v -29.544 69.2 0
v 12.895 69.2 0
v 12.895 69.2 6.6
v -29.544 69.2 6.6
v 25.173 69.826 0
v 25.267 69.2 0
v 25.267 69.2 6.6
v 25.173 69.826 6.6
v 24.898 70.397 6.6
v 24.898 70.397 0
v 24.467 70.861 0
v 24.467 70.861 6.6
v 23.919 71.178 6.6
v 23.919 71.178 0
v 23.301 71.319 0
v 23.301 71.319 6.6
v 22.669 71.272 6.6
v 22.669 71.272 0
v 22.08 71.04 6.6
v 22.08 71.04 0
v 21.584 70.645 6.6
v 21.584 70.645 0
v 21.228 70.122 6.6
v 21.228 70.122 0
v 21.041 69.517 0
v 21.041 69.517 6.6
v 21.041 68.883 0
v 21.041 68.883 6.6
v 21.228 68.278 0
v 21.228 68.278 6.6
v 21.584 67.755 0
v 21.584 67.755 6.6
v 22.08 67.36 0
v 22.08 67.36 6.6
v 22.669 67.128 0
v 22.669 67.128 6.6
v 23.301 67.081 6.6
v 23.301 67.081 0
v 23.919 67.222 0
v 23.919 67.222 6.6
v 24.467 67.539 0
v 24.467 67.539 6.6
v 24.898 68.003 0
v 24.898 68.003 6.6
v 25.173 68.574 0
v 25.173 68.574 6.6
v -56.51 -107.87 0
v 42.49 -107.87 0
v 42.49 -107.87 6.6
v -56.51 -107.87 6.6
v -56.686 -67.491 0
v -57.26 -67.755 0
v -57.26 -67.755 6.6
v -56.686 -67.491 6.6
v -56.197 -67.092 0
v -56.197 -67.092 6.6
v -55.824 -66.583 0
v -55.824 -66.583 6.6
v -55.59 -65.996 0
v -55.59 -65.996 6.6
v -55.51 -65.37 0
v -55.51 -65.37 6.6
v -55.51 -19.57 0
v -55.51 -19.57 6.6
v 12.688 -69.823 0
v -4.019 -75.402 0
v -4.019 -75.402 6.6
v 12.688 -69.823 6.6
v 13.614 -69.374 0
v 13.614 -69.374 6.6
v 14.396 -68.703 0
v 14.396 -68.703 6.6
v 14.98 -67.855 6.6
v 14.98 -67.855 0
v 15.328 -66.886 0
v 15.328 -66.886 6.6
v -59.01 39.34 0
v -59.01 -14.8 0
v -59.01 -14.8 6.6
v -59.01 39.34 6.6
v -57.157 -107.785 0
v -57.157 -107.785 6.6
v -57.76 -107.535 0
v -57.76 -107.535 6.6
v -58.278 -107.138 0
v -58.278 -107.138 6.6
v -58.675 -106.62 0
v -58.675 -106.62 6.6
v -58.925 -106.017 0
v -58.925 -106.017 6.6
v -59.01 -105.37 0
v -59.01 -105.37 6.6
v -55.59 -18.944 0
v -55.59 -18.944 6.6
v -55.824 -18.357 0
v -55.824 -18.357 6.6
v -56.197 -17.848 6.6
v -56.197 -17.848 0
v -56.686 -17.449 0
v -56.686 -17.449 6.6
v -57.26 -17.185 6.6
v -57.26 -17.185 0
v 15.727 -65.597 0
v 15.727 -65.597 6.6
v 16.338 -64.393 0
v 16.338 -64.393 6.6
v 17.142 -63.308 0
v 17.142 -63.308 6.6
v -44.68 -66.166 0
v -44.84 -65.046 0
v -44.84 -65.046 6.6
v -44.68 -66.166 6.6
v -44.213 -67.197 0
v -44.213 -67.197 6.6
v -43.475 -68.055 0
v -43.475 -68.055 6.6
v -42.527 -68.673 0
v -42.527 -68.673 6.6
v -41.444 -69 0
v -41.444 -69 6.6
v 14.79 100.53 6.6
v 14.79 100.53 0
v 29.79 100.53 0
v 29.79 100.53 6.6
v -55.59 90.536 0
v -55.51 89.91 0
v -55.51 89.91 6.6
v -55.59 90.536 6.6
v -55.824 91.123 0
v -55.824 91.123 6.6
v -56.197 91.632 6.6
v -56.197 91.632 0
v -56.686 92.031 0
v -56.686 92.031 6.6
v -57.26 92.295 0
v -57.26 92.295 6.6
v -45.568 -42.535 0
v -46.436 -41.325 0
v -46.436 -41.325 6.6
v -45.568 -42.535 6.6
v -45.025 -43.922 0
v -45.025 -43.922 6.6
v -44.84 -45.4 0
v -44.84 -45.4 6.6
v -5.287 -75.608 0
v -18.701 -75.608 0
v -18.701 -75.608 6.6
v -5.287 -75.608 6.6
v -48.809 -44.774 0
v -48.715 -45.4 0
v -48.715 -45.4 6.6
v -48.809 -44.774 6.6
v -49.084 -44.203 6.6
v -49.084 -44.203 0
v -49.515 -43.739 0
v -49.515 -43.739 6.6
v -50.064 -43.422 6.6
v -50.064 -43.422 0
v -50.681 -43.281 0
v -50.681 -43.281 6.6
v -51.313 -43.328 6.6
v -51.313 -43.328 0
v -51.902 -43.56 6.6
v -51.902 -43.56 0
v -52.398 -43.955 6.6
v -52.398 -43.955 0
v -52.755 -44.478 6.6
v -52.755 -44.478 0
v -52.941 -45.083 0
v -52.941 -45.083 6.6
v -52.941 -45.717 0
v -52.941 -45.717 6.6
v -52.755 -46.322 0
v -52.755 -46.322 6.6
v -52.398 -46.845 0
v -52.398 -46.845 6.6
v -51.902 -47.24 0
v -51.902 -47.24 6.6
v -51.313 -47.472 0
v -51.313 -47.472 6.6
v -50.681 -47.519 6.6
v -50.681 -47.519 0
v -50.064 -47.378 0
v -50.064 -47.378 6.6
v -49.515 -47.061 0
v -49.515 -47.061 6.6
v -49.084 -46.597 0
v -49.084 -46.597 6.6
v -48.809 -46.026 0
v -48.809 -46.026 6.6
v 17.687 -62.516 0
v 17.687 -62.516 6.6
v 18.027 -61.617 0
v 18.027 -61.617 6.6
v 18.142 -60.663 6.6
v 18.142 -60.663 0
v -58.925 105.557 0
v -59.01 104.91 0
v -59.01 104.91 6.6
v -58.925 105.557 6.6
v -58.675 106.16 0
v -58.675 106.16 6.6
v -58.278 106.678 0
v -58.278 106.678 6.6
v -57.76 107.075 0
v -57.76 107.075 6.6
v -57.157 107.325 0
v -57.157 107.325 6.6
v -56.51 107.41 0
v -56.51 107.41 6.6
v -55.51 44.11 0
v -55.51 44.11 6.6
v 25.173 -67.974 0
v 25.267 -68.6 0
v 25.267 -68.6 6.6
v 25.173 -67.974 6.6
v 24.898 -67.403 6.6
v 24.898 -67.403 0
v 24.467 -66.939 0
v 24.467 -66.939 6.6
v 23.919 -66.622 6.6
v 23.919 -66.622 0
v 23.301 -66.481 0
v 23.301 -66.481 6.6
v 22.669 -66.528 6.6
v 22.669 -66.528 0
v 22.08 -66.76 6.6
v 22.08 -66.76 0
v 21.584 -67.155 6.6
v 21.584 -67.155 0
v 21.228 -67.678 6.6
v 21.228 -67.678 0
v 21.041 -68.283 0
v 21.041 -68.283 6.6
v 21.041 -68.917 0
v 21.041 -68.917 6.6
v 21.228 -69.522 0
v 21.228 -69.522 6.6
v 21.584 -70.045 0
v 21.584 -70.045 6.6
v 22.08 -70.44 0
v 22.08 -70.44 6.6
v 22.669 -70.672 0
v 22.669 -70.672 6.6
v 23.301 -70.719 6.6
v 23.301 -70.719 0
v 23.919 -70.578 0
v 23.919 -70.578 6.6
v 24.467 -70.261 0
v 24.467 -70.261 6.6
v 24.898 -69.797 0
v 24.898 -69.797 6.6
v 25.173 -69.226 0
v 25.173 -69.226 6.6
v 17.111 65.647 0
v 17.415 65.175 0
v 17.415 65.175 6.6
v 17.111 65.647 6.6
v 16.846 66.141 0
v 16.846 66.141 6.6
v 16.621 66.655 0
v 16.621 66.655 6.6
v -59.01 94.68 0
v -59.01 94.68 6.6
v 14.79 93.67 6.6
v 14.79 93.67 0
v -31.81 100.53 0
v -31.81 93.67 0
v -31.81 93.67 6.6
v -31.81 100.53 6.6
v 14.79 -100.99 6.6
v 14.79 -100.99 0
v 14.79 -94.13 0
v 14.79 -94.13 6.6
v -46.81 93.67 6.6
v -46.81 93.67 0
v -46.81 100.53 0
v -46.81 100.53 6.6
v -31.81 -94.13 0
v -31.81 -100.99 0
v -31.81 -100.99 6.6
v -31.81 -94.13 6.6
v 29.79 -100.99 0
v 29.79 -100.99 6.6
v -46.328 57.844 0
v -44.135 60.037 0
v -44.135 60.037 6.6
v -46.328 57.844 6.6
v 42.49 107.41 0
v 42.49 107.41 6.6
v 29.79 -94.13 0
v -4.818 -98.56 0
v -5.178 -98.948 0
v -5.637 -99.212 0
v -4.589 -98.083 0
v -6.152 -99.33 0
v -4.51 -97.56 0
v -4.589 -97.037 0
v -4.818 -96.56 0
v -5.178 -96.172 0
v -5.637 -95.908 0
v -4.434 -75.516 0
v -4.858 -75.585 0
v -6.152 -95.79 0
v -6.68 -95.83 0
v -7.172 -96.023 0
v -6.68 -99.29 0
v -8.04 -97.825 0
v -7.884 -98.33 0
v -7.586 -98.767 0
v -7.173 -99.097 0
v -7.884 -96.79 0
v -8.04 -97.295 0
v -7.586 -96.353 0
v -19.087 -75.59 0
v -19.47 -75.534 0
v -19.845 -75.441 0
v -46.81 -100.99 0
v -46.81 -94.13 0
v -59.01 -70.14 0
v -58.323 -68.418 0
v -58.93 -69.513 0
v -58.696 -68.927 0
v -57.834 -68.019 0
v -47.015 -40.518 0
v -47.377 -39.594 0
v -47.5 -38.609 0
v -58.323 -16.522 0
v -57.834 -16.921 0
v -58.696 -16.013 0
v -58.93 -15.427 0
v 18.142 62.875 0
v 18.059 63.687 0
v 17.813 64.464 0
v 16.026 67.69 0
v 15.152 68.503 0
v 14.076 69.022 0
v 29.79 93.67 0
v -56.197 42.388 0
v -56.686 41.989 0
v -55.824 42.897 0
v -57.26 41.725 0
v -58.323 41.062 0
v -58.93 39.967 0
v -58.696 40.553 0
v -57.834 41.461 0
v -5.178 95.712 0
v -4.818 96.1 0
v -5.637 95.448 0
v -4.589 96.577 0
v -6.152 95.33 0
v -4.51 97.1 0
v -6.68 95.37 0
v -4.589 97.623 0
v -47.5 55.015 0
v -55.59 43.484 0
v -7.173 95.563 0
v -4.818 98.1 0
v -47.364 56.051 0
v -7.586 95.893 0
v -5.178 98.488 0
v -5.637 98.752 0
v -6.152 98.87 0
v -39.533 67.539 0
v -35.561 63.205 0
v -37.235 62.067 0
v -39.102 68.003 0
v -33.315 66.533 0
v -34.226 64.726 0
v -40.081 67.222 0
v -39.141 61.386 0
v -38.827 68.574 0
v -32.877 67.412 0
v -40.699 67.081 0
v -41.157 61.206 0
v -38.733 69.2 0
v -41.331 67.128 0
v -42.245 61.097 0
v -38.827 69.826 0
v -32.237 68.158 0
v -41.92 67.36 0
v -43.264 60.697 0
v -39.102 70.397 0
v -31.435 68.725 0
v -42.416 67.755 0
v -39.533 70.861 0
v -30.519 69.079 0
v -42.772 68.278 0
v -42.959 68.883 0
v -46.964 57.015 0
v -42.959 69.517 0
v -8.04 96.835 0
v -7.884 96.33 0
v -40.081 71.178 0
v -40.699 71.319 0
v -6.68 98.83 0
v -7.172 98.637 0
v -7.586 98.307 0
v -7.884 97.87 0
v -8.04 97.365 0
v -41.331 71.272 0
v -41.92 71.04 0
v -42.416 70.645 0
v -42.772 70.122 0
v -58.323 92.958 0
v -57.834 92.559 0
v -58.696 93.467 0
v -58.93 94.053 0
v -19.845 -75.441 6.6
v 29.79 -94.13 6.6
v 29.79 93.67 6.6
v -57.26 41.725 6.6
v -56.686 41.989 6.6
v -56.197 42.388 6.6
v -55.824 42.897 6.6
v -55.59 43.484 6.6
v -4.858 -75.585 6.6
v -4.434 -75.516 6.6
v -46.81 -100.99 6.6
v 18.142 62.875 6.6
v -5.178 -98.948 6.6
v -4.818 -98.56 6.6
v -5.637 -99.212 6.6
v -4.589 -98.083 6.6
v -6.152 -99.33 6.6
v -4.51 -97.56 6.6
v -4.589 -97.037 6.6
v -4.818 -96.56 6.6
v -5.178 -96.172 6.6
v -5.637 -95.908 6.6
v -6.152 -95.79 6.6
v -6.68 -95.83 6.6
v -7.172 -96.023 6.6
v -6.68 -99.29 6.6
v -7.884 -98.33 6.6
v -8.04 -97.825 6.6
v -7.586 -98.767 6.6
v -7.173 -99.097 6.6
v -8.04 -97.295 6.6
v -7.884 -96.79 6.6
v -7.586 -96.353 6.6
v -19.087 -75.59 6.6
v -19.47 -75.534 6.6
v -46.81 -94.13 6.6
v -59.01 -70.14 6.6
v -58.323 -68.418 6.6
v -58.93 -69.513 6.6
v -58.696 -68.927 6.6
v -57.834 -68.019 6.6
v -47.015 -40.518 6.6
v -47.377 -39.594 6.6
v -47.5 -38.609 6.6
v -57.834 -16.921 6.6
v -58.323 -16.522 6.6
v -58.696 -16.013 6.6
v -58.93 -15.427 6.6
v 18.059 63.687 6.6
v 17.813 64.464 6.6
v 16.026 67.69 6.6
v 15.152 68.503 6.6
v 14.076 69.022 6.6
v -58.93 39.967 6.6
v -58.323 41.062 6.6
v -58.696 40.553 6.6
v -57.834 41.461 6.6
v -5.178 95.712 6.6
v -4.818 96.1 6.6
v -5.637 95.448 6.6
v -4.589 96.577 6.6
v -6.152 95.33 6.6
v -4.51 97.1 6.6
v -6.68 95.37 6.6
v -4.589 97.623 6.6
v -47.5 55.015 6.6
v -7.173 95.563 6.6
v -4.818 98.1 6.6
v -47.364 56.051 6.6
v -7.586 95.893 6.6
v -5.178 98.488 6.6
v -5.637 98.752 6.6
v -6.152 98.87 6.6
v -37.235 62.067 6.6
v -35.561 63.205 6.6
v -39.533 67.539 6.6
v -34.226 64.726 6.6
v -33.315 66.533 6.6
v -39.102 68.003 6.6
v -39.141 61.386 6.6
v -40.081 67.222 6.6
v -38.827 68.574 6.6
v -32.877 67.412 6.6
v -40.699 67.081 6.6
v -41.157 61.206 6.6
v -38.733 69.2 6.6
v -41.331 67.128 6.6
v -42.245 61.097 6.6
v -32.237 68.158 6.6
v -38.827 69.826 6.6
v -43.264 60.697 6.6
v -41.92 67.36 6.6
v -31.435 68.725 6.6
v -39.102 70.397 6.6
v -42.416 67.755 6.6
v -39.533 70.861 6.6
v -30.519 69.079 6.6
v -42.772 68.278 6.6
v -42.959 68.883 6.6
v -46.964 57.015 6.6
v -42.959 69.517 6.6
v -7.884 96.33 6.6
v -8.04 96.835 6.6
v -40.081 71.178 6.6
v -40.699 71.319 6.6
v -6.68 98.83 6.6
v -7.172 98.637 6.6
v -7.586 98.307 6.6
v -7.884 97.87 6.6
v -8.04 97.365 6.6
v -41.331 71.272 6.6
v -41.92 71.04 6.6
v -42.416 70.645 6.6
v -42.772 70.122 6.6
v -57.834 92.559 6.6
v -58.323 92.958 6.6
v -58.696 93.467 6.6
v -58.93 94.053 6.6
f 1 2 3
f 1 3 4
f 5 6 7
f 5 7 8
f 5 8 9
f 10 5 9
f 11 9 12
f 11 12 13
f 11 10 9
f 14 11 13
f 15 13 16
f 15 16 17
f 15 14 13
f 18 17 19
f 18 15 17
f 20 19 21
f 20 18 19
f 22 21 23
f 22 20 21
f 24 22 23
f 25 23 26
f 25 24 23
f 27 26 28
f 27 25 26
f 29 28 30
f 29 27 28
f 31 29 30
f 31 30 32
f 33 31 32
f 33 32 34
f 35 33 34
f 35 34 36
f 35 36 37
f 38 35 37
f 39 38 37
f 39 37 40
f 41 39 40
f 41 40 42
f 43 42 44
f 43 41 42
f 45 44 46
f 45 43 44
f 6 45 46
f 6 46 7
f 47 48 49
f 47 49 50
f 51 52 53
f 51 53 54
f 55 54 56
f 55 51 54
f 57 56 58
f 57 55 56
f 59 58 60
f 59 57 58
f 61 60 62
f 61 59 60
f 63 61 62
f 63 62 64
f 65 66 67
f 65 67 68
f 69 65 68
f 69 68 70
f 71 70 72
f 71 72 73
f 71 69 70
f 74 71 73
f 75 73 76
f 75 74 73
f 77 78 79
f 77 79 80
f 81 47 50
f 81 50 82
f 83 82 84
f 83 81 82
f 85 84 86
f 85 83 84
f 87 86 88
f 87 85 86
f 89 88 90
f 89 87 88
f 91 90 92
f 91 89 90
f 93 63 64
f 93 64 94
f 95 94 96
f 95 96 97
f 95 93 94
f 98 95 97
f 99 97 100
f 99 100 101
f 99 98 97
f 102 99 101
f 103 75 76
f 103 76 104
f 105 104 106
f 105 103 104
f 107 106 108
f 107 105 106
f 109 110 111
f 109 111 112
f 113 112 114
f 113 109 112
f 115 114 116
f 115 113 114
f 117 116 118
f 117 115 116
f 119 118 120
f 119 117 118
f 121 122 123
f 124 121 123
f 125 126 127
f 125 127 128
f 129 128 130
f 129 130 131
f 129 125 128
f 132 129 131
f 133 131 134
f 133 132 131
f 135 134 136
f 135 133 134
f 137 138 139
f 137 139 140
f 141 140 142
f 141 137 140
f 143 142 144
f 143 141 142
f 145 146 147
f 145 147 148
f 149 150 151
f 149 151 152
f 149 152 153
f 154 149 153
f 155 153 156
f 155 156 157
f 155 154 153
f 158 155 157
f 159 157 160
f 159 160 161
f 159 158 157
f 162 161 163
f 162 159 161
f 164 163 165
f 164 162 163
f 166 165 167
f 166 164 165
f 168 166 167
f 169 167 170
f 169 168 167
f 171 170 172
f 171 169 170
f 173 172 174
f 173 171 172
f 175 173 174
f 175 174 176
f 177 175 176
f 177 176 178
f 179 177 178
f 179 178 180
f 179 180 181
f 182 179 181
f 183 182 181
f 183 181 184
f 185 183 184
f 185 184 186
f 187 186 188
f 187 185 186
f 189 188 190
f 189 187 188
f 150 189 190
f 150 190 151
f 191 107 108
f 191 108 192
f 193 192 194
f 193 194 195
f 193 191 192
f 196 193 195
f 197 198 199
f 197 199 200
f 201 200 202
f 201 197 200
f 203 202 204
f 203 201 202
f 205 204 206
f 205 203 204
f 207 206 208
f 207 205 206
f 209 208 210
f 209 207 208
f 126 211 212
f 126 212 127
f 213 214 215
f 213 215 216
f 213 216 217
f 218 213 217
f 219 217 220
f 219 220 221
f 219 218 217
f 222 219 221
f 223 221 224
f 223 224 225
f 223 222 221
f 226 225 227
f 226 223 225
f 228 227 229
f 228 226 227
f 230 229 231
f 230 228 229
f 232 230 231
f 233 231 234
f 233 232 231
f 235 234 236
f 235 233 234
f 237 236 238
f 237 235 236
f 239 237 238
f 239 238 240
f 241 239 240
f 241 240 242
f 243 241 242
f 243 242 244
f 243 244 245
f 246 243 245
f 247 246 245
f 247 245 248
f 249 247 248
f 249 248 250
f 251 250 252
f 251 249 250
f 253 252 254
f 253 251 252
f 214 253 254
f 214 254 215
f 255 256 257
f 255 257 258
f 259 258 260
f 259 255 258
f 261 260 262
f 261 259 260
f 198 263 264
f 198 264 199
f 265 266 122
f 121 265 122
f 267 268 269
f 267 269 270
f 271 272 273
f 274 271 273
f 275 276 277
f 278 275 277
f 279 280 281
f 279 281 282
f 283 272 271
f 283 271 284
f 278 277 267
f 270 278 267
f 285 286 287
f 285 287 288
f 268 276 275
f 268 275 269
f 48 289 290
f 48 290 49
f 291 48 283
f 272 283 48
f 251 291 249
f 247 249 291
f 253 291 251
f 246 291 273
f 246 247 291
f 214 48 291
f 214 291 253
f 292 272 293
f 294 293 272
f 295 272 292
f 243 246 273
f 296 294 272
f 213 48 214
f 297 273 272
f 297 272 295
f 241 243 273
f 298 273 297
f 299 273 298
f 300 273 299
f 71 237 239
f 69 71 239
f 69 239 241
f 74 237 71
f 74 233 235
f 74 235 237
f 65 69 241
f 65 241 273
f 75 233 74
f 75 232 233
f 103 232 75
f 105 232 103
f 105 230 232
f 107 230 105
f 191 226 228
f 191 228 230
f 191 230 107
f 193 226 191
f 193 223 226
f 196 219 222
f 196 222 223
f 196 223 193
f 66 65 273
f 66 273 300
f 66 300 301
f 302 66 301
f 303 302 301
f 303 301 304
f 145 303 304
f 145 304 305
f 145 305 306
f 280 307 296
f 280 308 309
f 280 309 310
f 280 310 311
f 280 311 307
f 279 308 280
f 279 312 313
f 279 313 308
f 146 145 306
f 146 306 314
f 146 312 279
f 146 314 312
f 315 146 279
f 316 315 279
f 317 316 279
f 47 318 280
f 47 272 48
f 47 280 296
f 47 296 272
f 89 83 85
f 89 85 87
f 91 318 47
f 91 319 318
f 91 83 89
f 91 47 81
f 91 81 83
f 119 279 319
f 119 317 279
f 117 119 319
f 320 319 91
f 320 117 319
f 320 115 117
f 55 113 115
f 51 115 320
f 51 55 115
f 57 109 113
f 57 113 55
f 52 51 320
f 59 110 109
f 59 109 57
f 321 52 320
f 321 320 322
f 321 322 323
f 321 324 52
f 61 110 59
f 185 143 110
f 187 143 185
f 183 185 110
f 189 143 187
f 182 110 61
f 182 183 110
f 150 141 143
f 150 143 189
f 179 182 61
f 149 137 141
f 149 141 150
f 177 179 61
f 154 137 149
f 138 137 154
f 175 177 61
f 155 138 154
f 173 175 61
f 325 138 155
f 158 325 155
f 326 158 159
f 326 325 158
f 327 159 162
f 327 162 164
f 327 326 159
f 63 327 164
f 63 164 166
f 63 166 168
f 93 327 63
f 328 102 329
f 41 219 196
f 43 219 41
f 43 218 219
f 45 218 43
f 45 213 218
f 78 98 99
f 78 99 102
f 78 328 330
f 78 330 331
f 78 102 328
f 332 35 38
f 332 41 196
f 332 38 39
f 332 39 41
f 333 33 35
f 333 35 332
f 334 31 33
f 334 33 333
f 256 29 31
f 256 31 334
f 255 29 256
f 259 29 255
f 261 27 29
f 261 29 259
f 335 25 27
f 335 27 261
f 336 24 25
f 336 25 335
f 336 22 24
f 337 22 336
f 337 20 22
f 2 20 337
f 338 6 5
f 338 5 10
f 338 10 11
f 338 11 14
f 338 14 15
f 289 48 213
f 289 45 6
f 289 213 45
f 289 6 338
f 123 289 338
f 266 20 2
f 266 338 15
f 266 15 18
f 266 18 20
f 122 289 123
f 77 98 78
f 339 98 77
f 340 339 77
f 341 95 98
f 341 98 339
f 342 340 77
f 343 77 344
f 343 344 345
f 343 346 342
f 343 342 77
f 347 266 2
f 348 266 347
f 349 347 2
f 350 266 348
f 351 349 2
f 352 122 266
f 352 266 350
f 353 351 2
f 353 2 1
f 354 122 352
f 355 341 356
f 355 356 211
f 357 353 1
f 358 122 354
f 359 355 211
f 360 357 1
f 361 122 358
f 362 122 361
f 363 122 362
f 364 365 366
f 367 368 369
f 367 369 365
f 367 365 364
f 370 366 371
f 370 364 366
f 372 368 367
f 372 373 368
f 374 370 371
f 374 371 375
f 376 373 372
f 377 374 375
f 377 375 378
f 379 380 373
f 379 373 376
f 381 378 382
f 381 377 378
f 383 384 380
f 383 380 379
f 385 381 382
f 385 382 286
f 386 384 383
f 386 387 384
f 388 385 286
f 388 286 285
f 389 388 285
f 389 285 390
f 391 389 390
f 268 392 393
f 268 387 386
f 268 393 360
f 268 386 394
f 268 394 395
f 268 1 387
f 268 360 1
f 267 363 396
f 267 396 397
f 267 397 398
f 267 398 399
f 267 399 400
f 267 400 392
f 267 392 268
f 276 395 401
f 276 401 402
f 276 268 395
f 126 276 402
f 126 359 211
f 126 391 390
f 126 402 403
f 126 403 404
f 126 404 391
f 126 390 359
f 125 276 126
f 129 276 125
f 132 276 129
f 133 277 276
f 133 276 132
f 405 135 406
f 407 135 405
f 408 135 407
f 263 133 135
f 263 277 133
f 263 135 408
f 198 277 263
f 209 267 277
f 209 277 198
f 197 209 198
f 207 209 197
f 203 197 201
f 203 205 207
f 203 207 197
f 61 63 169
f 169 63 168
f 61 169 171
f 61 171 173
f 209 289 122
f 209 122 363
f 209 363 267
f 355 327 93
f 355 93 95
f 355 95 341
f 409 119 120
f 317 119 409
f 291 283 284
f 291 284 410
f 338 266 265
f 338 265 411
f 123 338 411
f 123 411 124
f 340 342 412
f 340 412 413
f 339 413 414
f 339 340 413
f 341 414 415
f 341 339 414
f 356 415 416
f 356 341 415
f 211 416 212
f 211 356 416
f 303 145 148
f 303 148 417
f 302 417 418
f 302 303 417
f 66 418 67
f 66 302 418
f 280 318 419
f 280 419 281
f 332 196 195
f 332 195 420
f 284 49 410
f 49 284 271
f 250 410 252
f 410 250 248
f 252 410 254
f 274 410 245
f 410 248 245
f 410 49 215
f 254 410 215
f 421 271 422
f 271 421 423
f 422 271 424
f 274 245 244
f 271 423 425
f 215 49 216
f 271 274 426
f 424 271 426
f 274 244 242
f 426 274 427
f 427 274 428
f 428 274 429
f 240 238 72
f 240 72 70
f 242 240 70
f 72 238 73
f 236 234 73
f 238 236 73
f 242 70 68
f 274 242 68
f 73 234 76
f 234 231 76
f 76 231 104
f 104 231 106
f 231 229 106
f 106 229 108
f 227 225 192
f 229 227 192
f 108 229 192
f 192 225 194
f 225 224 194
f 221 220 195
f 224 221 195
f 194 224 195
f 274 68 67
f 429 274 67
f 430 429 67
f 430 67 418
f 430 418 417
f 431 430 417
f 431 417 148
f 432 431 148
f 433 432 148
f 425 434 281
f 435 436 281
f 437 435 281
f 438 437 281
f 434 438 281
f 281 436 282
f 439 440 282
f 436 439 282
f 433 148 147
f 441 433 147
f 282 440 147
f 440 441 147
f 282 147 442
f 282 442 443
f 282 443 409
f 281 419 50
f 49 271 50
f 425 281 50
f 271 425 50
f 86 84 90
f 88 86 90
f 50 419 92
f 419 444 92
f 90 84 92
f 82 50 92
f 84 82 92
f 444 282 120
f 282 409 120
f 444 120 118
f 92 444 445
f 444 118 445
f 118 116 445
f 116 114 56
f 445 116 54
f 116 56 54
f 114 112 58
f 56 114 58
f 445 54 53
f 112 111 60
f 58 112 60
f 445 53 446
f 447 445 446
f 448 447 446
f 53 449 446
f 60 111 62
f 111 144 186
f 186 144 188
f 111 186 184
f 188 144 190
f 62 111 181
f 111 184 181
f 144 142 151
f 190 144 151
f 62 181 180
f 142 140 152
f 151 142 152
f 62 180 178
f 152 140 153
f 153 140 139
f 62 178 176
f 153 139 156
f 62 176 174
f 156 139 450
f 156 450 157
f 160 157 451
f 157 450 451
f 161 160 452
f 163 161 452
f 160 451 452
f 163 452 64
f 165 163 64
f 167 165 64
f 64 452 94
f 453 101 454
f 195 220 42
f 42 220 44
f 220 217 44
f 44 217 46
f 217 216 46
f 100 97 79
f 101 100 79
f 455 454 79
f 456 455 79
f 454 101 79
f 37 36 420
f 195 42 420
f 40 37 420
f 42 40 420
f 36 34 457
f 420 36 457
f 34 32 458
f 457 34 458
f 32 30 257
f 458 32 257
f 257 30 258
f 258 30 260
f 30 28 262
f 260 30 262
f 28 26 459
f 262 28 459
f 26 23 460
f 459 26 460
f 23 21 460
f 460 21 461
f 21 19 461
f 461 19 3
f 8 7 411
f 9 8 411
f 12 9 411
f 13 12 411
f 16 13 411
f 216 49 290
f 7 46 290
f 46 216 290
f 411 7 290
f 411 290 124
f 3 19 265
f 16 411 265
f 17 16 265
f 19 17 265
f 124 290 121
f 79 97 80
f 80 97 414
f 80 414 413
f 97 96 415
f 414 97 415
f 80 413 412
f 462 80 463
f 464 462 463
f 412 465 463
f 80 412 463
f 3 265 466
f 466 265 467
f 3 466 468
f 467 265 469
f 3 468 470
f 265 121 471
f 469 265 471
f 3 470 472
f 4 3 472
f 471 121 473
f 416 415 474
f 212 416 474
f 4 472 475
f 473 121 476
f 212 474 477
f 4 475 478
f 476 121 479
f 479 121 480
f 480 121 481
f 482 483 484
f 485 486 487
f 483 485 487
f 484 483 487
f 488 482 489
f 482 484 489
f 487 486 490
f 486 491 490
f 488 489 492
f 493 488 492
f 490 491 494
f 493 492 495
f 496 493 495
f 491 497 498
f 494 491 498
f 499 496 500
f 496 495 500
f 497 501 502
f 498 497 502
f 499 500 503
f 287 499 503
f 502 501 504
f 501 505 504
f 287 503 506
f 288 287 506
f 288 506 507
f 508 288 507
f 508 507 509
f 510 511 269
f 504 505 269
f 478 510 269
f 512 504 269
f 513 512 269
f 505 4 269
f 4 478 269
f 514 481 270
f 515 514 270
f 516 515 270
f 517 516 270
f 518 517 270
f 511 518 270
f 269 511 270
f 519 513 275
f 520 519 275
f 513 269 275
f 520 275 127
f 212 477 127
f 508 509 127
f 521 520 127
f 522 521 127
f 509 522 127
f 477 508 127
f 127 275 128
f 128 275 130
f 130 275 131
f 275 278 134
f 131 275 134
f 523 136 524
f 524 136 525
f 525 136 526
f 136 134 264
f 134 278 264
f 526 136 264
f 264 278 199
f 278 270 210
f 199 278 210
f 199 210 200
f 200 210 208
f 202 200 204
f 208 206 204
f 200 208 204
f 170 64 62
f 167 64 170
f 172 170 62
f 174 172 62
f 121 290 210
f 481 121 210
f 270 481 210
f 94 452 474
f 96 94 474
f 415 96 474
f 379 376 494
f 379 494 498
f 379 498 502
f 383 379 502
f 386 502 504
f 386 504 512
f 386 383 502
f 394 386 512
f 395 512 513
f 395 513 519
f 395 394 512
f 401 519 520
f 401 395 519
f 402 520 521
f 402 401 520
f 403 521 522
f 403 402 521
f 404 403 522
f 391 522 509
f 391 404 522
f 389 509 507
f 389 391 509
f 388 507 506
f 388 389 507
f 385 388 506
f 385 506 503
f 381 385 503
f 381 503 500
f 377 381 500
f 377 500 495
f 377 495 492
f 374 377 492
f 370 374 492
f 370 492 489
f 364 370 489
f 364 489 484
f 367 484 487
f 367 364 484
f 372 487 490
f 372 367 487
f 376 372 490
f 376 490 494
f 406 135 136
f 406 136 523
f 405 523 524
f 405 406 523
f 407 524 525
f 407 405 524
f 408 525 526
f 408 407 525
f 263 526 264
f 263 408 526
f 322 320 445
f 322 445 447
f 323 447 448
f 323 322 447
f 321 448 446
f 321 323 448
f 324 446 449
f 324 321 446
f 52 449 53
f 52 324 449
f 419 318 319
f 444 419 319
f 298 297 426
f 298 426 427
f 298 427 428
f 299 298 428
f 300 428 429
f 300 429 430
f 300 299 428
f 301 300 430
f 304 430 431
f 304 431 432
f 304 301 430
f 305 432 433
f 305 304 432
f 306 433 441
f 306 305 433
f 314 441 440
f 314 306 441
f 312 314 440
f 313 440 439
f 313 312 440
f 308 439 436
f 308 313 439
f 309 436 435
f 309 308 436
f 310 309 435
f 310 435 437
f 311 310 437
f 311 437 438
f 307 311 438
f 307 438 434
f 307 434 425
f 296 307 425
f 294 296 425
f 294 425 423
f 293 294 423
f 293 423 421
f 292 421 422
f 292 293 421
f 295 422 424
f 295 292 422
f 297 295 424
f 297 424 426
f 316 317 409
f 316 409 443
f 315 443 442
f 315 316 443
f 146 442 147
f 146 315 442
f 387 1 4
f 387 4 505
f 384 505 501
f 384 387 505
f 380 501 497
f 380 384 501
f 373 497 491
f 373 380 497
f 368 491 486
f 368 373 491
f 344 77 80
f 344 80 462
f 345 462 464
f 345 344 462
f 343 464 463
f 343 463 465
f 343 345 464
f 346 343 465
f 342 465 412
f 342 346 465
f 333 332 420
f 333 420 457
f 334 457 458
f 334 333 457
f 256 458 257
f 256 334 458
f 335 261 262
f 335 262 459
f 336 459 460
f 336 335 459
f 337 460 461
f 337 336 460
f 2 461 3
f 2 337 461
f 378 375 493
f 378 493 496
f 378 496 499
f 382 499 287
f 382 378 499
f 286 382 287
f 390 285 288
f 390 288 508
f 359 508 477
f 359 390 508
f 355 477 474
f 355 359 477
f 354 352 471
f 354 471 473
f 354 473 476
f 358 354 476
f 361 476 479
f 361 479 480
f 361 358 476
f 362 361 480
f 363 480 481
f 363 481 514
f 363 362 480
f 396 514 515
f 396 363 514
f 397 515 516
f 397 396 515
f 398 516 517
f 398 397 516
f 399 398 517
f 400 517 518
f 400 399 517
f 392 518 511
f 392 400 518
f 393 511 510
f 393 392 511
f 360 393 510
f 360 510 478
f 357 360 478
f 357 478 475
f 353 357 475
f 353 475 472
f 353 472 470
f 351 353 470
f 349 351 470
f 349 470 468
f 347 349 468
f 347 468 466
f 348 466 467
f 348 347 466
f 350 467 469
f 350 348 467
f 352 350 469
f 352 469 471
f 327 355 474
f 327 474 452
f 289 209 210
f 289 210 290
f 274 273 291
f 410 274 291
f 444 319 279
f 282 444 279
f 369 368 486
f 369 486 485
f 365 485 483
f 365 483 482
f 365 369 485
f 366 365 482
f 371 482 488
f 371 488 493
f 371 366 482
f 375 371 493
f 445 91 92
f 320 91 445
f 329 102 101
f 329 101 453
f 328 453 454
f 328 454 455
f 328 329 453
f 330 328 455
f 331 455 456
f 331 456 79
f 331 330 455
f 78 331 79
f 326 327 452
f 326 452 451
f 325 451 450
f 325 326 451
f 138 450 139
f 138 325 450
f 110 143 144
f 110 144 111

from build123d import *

# Parameters (mm, degrees)
MODEL_R             = 2.125
MODEL_R_2           = 1.775
MODEL_W             = 15
MODEL_H             = 6.86
BOSS_EXTRUDE1_DEPTH = 6.6


with BuildPart() as part:
    # Model → Boss-Extrude1 (new body)
    with BuildSketch(Plane.XY):
        with BuildLine():
            Line((-55.51, -65.37), (-55.51, -19.57))
            ThreePointArc((-55.51, -19.57), (-55.994435563, -18.090980054), (-57.26, -17.185151996))
            ThreePointArc((-57.26, -17.185151996), (-58.525564437, -16.279323939), (-59.01, -14.800303993))
            Line((-59.01, -14.800303993), (-59.01, 39.340303993))
            ThreePointArc((-59.01, 39.340303993), (-58.525564437, 40.819323939), (-57.26, 41.725151996))
            ThreePointArc((-57.26, 41.725151996), (-55.994435563, 42.630980054), (-55.51, 44.11))
            Line((-55.51, 44.11), (-55.51, 89.91))
            ThreePointArc((-55.51, 89.91), (-55.994435563, 91.389019946), (-57.26, 92.294848004))
            ThreePointArc((-57.26, 92.294848004), (-58.525564437, 93.200676061), (-59.01, 94.679696007))
            Line((-59.01, 94.679696007), (-59.01, 104.91))
            ThreePointArc((-59.01, 104.91), (-58.277766953, 106.677766953), (-56.51, 107.41))
            Line((-56.51, 107.41), (42.49, 107.41))
            Line((42.49, 107.41), (42.49, -107.87))
            Line((42.49, -107.87), (-56.51, -107.87))
            ThreePointArc((-56.51, -107.87), (-58.277766953, -107.137766953), (-59.01, -105.37))
            Line((-59.01, -105.37), (-59.01, -70.139696007))
            ThreePointArc((-59.01, -70.139696007), (-58.525564437, -68.660676061), (-57.26, -67.754848004))
            ThreePointArc((-57.26, -67.754848004), (-55.994435563, -66.849019946), (-55.51, -65.37))
        make_face()
        with Locations((-50.84, -45.4)):
            Circle(MODEL_R, mode=Mode.SUBTRACT)
        with Locations((23.1422, 69.2)):
            Circle(MODEL_R, mode=Mode.SUBTRACT)
        with Locations((-40.8578, 69.2)):
            Circle(MODEL_R, mode=Mode.SUBTRACT)
        with Locations((23.1422, -68.6)):
            Circle(MODEL_R, mode=Mode.SUBTRACT)
        with Locations((-6.285, -97.56)):
            Circle(MODEL_R_2, mode=Mode.SUBTRACT)
        with Locations((-6.285, 97.1)):
            Circle(MODEL_R_2, mode=Mode.SUBTRACT)
        with BuildLine():
            Line((-44.84, -45.4), (-44.84, -65.045820713))
            ThreePointArc((-44.84, -65.045820713), (-43.874373192, -67.652078439), (-41.443710334, -69))
            Line((-41.443710334, -69), (-19.844586098, -75.441455972))
            ThreePointArc((-19.844586098, -75.441455972), (-19.279062125, -75.566358805), (-18.701428861, -75.608286065))
            Line((-18.701428861, -75.608286065), (-5.286503503, -75.608286065))
            ThreePointArc((-5.286503503, -75.608286065), (-4.644685592, -75.556459031), (-4.01949944, -75.402320949))
            Line((-4.01949944, -75.402320949), (12.687875453, -69.822954253))
            ThreePointArc((12.687875453, -69.822954253), (14.395659936, -68.702986141), (15.327980927, -66.885946246))
            ThreePointArc((15.327980927, -66.885946246), (16.007236983, -64.981671277), (17.1422, -63.308497378))
            ThreePointArc((17.1422, -63.308497378), (17.883857387, -62.076959629), (18.1422, -60.662746067))
            Line((18.1422, -60.662746067), (18.1422, 62.87544468))
            ThreePointArc((18.1422, 62.87544468), (17.956050357, 64.081490058), (17.414927273, 65.175282978))
            ThreePointArc((17.414927273, 65.175282978), (16.973667336, 65.891041739), (16.621413149, 66.654545455))
            ThreePointArc((16.621413149, 66.654545455), (15.151553533, 68.502891295), (12.895249234, 69.2))
            Line((12.895249234, 69.2), (-29.544091501, 69.2))
            ThreePointArc((-29.544091501, 69.2), (-31.853492578, 68.465986324), (-33.315327667, 66.533333333))
            ThreePointArc((-33.315327667, 66.533333333), (-36.362052556, 62.582730554), (-41.157187314, 61.205604011))
            ThreePointArc((-41.157187314, 61.205604011), (-42.768185041, 60.931924569), (-44.135308096, 60.036833141))
            Line((-44.135308096, 60.036833141), (-46.328427125, 57.843714112))
            ThreePointArc((-46.328427125, 57.843714112), (-47.19551813, 56.546020717), (-47.5, 55.015286987))
            Line((-47.5, 55.015286987), (-47.5, -38.608505319))
            ThreePointArc((-47.5, -38.608505319), (-47.224513391, -40.067271921), (-46.436, -41.325103191))
            ThreePointArc((-46.436, -41.325103191), (-45.253229913, -43.211850097), (-44.84, -45.4))
        make_face(mode=Mode.SUBTRACT)
        with Locations((-39.31, 97.1)):
            Rectangle(MODEL_W, MODEL_H, mode=Mode.SUBTRACT)
        with Locations((22.29, 97.1)):
            Rectangle(MODEL_W, MODEL_H, mode=Mode.SUBTRACT)
        with Locations((-39.31, -97.56)):
            Rectangle(MODEL_W, MODEL_H, mode=Mode.SUBTRACT)
        with Locations((22.29, -97.56)):
            Rectangle(MODEL_W, MODEL_H, mode=Mode.SUBTRACT)
    extrude(amount=BOSS_EXTRUDE1_DEPTH)


solid = part.part
